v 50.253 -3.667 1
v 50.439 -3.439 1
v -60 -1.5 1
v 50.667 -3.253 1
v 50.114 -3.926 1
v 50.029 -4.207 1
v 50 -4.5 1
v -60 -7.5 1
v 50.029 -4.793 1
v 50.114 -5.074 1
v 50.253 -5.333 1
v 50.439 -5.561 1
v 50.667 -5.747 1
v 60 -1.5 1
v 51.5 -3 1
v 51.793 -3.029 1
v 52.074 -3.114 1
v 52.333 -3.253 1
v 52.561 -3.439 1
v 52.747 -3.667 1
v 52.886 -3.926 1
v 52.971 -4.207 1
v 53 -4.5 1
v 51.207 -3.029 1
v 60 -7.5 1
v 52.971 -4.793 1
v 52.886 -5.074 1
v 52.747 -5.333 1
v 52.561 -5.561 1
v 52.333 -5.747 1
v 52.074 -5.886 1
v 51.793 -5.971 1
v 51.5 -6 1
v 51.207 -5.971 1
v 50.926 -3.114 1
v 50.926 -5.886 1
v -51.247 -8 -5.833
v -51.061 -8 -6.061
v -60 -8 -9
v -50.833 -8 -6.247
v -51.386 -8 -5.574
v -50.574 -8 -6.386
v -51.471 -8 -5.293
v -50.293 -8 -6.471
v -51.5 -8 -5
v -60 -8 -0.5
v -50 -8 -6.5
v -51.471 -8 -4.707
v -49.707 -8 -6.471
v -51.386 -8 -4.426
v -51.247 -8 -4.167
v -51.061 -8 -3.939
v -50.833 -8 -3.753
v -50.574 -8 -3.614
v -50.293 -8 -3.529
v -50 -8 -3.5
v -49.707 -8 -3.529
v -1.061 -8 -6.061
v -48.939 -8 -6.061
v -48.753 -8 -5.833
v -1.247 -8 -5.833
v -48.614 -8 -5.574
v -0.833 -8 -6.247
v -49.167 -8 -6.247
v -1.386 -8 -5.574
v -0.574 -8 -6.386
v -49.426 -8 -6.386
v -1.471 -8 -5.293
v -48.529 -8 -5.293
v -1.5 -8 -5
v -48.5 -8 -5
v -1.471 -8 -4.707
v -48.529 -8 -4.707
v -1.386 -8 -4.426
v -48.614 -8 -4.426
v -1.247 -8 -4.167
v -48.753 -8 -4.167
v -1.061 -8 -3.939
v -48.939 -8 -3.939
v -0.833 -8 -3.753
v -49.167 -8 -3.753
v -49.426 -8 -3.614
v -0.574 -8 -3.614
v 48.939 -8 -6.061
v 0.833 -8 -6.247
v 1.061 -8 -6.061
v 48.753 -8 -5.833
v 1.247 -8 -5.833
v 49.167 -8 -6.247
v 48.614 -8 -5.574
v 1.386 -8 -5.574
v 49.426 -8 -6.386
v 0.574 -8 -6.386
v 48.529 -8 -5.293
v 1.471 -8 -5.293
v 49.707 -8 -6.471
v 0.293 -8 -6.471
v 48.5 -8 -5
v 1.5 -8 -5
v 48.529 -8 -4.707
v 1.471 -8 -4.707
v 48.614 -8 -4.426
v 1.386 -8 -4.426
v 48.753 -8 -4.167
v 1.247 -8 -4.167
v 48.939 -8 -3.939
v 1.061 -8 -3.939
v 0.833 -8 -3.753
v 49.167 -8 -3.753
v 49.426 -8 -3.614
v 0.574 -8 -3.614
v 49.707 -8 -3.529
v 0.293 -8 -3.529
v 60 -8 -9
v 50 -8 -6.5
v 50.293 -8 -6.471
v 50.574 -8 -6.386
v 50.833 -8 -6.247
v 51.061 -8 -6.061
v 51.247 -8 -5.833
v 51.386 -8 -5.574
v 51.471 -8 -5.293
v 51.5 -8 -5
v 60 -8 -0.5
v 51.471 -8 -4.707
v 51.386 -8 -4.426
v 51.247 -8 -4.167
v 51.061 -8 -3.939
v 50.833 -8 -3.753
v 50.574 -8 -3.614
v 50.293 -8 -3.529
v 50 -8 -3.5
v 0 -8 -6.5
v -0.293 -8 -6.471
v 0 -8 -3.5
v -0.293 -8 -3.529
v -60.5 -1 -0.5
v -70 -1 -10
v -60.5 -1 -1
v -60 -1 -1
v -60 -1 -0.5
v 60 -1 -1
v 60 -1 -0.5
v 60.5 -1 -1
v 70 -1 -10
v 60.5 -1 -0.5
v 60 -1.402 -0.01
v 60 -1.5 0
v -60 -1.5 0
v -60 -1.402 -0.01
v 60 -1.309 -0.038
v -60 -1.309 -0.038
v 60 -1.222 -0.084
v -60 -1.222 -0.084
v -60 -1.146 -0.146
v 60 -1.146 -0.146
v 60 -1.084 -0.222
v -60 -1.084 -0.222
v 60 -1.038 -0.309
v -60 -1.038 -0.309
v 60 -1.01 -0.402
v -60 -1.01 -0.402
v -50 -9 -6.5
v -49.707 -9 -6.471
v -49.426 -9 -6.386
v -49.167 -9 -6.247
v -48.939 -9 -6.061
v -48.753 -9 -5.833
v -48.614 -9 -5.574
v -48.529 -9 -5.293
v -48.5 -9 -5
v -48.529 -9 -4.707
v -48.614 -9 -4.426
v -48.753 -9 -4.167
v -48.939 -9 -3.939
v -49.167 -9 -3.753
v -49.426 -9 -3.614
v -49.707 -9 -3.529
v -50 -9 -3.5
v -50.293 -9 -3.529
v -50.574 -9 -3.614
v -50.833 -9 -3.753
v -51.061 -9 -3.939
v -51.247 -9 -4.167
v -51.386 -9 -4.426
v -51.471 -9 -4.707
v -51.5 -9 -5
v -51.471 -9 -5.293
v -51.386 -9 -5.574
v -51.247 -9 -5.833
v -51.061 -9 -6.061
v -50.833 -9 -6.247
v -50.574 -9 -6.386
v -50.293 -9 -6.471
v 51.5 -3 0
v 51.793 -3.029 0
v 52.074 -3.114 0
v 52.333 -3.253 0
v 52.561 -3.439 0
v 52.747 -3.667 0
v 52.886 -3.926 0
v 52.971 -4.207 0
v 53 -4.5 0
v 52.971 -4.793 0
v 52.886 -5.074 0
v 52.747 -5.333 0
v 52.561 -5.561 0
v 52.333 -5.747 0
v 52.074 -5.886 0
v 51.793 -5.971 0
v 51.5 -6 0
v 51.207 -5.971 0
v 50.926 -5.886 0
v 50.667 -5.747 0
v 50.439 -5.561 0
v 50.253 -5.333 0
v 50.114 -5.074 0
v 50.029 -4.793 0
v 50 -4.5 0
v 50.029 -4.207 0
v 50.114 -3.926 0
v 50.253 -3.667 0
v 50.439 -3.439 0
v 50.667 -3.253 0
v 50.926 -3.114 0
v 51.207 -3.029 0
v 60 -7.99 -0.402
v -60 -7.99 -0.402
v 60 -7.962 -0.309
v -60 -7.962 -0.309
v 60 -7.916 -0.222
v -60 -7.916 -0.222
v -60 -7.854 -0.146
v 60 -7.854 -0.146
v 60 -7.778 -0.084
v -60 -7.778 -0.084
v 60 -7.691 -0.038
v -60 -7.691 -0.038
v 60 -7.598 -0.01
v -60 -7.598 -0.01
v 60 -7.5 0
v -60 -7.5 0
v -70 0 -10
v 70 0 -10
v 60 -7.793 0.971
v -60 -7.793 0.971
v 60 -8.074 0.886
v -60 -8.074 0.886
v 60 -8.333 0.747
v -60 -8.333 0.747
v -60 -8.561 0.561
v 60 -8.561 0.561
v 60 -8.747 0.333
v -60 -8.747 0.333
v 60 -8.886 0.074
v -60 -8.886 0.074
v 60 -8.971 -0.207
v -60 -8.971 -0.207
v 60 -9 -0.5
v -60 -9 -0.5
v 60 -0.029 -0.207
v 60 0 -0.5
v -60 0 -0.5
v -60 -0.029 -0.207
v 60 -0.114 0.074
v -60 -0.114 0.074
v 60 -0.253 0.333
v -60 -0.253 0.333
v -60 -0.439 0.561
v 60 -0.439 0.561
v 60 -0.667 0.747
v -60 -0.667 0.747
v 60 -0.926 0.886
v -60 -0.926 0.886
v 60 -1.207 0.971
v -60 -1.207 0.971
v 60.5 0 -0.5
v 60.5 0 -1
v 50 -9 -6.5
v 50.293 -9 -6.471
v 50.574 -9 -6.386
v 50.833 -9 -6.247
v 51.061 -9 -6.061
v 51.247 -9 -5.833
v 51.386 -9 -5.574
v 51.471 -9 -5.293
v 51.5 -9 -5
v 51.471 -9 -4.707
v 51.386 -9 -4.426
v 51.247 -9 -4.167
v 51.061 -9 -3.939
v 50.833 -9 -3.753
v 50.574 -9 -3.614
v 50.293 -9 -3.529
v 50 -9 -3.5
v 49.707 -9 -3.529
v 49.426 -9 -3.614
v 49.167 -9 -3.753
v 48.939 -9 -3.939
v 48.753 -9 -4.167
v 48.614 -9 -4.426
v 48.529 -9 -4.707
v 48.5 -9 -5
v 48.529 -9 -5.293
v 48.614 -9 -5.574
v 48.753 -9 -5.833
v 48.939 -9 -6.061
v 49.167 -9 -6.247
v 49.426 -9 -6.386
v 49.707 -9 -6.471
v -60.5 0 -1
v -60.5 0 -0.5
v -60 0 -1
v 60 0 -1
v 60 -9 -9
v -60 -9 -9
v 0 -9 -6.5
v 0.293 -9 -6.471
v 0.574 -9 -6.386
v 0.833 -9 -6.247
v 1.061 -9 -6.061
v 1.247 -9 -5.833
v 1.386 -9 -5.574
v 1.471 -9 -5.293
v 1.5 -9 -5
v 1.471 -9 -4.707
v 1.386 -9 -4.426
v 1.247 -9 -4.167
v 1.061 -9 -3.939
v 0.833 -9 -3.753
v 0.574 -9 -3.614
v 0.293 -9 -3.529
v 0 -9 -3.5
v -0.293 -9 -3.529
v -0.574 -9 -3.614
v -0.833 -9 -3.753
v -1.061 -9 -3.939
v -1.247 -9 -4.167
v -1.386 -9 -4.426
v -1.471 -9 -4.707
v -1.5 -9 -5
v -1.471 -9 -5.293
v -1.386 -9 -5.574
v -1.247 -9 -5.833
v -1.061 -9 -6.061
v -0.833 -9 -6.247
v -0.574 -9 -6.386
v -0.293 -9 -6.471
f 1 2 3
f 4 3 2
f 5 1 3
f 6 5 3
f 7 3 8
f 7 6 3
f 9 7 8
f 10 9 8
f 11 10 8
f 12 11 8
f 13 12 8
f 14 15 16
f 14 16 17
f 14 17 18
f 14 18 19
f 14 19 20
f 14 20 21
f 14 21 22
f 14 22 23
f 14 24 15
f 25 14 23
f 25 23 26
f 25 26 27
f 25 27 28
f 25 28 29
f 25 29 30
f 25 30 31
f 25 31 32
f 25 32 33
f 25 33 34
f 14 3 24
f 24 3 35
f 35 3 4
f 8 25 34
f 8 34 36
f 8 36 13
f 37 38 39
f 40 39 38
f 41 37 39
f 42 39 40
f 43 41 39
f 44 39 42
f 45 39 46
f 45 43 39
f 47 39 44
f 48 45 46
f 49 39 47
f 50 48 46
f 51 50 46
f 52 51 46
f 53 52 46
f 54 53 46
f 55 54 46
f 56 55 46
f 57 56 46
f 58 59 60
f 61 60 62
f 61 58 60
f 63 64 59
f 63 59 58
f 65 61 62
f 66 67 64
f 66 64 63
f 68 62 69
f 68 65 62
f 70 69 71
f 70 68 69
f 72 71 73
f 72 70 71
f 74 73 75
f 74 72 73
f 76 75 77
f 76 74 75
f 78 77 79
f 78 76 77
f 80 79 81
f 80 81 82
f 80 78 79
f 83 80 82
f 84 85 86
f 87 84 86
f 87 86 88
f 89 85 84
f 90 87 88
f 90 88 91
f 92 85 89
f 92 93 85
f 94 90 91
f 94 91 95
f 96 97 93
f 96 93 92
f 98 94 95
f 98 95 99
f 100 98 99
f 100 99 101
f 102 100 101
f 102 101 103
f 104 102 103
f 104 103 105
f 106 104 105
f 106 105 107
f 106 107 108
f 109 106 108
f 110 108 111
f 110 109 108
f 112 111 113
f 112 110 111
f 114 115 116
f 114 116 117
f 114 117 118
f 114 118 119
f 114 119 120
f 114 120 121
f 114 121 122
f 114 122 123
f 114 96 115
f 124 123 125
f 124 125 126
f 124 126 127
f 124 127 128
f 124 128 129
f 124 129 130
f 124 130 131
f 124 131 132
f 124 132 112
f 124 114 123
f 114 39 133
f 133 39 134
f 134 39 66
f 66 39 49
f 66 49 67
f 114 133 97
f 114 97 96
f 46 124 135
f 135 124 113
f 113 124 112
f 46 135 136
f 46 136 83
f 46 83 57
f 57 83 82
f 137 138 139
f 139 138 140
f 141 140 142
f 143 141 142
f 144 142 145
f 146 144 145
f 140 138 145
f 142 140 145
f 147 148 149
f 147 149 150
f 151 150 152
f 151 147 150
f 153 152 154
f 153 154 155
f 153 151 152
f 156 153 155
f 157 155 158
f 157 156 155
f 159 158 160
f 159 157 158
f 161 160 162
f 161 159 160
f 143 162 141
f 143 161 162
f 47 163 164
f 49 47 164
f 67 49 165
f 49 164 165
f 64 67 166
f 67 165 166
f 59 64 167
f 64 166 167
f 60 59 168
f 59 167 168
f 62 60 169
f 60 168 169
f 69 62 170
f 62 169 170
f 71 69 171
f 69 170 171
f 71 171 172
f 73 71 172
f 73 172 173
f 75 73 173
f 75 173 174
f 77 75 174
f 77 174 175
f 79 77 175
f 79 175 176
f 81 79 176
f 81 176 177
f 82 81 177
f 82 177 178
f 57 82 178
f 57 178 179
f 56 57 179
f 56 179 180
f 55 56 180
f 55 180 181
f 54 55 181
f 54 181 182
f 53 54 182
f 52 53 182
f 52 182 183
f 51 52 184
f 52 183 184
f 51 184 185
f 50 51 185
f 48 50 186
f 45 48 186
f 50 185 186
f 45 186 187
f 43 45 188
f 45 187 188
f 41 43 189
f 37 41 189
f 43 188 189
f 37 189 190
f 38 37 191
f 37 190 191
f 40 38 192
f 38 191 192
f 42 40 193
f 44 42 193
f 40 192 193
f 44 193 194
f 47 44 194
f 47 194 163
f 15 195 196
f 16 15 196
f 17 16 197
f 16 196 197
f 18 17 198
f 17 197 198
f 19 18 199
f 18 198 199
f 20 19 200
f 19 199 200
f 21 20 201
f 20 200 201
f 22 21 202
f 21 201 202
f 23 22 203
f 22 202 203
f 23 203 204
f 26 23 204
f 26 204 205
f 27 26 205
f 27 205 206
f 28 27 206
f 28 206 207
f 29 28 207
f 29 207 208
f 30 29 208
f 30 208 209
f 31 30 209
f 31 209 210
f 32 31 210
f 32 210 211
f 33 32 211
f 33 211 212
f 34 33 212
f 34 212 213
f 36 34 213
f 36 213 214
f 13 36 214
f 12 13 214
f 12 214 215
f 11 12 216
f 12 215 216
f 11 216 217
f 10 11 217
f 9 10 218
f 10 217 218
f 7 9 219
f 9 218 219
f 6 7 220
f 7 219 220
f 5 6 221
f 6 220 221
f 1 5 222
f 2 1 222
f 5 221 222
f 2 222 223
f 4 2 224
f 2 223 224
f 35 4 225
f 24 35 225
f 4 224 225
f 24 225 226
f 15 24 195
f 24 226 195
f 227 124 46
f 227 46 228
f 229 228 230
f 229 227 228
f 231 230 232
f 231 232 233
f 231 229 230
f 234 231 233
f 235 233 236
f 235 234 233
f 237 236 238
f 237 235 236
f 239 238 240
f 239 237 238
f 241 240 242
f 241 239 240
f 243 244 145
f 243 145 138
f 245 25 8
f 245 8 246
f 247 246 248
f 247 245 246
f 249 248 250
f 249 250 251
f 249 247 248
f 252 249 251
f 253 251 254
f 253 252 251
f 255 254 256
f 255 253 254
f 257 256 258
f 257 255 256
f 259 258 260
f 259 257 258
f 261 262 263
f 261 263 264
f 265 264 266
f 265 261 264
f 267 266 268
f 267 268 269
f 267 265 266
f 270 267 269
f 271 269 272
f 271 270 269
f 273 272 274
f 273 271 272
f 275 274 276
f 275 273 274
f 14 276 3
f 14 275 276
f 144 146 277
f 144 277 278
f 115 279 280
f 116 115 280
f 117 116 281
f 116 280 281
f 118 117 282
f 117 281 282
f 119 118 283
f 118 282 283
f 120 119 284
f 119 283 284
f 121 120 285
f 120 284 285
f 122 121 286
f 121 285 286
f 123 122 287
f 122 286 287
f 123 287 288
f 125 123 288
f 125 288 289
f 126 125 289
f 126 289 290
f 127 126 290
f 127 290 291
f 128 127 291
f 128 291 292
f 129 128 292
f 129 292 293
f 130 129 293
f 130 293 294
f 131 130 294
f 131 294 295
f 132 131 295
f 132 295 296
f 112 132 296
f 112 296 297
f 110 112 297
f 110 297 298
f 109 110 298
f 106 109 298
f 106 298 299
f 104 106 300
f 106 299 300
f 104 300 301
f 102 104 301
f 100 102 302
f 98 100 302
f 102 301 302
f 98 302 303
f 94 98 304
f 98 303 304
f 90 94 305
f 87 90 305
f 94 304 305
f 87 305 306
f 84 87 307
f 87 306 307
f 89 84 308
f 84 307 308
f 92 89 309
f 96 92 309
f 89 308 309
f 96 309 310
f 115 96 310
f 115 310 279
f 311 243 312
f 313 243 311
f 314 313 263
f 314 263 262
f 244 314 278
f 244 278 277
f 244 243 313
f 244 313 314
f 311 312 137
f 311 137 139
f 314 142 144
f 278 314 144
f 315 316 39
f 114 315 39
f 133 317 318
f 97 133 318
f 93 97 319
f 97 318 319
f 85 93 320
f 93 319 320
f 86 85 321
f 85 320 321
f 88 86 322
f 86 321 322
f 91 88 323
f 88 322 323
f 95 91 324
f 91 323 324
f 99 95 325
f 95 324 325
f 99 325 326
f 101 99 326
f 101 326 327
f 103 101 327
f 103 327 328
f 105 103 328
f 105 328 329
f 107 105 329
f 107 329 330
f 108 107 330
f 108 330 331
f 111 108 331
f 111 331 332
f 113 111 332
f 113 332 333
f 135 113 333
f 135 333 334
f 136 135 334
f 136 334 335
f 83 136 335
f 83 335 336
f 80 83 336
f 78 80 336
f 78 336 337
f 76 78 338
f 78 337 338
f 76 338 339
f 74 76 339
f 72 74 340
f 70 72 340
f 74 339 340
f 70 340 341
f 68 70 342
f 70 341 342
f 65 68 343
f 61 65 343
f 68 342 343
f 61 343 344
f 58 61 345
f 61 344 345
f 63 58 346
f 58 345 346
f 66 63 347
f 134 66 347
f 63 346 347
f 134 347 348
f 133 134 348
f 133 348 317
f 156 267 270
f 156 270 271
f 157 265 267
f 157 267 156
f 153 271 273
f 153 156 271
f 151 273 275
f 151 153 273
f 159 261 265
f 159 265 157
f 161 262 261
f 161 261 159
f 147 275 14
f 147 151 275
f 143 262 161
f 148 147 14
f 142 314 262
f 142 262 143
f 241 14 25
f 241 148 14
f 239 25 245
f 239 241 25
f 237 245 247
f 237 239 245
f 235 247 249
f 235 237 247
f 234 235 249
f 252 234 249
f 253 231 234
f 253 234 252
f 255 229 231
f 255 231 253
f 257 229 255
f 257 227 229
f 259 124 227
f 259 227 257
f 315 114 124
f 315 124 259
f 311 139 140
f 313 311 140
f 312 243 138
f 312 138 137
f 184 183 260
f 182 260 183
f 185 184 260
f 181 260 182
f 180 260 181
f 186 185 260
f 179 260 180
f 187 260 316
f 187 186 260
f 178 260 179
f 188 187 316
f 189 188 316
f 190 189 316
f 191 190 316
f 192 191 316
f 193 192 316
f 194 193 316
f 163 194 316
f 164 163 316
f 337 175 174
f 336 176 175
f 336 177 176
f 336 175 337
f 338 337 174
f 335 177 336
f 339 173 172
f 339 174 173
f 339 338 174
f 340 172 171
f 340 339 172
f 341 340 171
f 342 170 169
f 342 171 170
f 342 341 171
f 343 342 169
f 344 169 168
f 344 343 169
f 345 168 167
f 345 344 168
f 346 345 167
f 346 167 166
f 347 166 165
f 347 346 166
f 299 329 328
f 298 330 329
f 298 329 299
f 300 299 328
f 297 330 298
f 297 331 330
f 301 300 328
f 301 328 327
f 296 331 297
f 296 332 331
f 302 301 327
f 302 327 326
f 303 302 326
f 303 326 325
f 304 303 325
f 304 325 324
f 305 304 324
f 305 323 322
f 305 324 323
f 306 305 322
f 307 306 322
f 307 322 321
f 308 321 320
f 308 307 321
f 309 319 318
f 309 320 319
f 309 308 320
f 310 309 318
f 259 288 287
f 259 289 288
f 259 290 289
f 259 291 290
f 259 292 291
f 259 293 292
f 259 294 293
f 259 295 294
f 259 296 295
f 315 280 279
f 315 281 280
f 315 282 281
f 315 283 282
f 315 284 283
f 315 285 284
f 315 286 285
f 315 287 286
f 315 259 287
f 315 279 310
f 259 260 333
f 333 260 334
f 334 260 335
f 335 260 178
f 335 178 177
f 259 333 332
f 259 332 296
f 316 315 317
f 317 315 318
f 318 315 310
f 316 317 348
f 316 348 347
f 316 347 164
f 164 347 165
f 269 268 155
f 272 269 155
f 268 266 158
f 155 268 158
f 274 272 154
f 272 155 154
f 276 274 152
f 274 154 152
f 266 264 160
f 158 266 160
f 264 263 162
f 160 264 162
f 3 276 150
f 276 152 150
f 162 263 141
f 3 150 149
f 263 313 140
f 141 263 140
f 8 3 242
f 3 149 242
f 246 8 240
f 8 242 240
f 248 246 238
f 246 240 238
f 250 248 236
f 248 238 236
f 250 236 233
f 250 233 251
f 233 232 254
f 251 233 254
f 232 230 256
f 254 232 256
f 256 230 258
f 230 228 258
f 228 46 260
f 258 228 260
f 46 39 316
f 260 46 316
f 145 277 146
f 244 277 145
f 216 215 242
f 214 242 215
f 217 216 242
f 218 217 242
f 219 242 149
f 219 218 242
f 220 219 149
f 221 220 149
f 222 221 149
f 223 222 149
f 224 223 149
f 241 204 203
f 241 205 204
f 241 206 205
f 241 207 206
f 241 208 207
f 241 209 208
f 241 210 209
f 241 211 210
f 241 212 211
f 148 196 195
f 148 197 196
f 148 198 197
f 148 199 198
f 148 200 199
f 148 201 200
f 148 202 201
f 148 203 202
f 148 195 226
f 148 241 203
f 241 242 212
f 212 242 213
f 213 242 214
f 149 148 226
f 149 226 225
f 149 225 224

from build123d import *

# Parameters (mm, degrees)
BASE_FLANGE1_DEPTH            = 1
EDGE_FLANGE1_STRIP_W          = 5
EDGE_FLANGE1_STRIP_H          = 1
EDGE_FLANGE1_STRIP_CUT_DEPTH  = 120
EDGE_FLANGE1_RELIEF_W         = 5.5
EDGE_FLANGE1_RELIEF_H         = 0.5
EDGE_FLANGE1_RELIEF_CUT_DEPTH = 1
EDGE_FLANGE1_DEPTH            = 120
EDGE_FLANGE2_STRIP_W          = 5
EDGE_FLANGE2_STRIP_H          = 1
EDGE_FLANGE2_STRIP_CUT_DEPTH  = 120
EDGE_FLANGE2_DEPTH            = 120
SKETCH12_R                    = 1.5
CUT_EXTRUDE1_DEPTH            = 3
SKETCH13_R                    = 1.5
CUT_EXTRUDE2_DEPTH            = 3


# Sheet-metal steps are written as plain solids
with BuildPart() as part:
    # Sketch1 → Base-Flange1 (new body)
    with BuildSketch(Plane(origin=(0, 0, 0), x_dir=(1, 0, 0), z_dir=(0, 1, 0))):
        Polygon((-60, 0), (60, 0), (70, 10), (-70, 10), align=None)
    extrude(amount=-BASE_FLANGE1_DEPTH)

    # Edge-Flange1 strip (across the edge) → Edge-Flange1 strip cut (cut)
    with BuildSketch(Plane(origin=(60, -1, 0), x_dir=(0, 0, -1), z_dir=(-1, 0, 0))):
        with Locations((-2, -0.5)):
            Rectangle(EDGE_FLANGE1_STRIP_W, EDGE_FLANGE1_STRIP_H)
    extrude(amount=EDGE_FLANGE1_STRIP_CUT_DEPTH, mode=Mode.SUBTRACT)

    # Edge-Flange1 relief (on the sheet) → Edge-Flange1 relief cut (cut)
    with BuildSketch(Plane(origin=(60, -1, -0.5), x_dir=(0, 0, -1), z_dir=(0, -1, 0))):
        with Locations((-2.25, 0.25)):
            Rectangle(EDGE_FLANGE1_RELIEF_W, EDGE_FLANGE1_RELIEF_H)
        with Locations((-2.25, -120.25)):
            Rectangle(EDGE_FLANGE1_RELIEF_W, EDGE_FLANGE1_RELIEF_H)
    extrude(amount=-EDGE_FLANGE1_RELIEF_CUT_DEPTH, mode=Mode.SUBTRACT)

    # Edge-Flange1 section (across the edge) → Edge-Flange1 (add)
    with BuildSketch(Plane(origin=(60, -1, 0), x_dir=(0, 0, -1), z_dir=(-1, 0, 0))):
        with BuildLine():
            Line((-1, 0.5), (-1, 7))
            Line((-1, 7), (0, 7))
            Line((0, 7), (0, 0.5))
            ThreePointArc((0, 0.5), (0.146446609, 0.146446609), (0.5, 0))
            Line((0.5, 0), (0.5, -1))
            ThreePointArc((0.5, -1), (-0.560660172, -0.560660172), (-1, 0.5))
        make_face()
    extrude(amount=EDGE_FLANGE1_DEPTH)

    # Edge-Flange2 strip (across the edge) → Edge-Flange2 strip cut (cut)
    with BuildSketch(Plane(origin=(60, -8, 0), x_dir=(0, 1, 0), z_dir=(-1, 0, 0))):
        with Locations((-2, -0.5)):
            Rectangle(EDGE_FLANGE2_STRIP_W, EDGE_FLANGE2_STRIP_H)
    extrude(amount=EDGE_FLANGE2_STRIP_CUT_DEPTH, mode=Mode.SUBTRACT)

    # Edge-Flange2 section (across the edge) → Edge-Flange2 (add)
    with BuildSketch(Plane(origin=(60, -8, 0), x_dir=(0, 1, 0), z_dir=(-1, 0, 0))):
        with BuildLine():
            Line((-1, 0.5), (-1, 9))
            Line((-1, 9), (0, 9))
            Line((0, 9), (0, 0.5))
            ThreePointArc((0, 0.5), (0.146446609, 0.146446609), (0.5, 0))
            Line((0.5, 0), (0.5, -1))
            ThreePointArc((0.5, -1), (-0.560660172, -0.560660172), (-1, 0.5))
        make_face()
    extrude(amount=EDGE_FLANGE2_DEPTH)

    # Sketch12 → Cut-Extrude1 (cut)
    with BuildSketch(Plane.XZ.offset(9)):
        with Locations(Location((-50, -5, 0), (0, 0, 270))):
            Circle(SKETCH12_R)
        with Locations(Location((0, -5, 0), (0, 0, 270))):
            Circle(SKETCH12_R)
        with Locations(Location((50, -5, 0), (0, 0, 270))):
            Circle(SKETCH12_R)
    extrude(amount=-CUT_EXTRUDE1_DEPTH, mode=Mode.SUBTRACT)

    # Sketch13 → Cut-Extrude2 (cut)
    with BuildSketch(Plane(origin=(0, 0, 0), x_dir=(-1, 0, 0), z_dir=(0, 0, -1))):
        with Locations(Location((-51.5, -4.5, 0), (0, 0, 90))):
            Circle(SKETCH13_R)
    extrude(amount=-CUT_EXTRUDE2_DEPTH, mode=Mode.SUBTRACT)


solid = part.part
